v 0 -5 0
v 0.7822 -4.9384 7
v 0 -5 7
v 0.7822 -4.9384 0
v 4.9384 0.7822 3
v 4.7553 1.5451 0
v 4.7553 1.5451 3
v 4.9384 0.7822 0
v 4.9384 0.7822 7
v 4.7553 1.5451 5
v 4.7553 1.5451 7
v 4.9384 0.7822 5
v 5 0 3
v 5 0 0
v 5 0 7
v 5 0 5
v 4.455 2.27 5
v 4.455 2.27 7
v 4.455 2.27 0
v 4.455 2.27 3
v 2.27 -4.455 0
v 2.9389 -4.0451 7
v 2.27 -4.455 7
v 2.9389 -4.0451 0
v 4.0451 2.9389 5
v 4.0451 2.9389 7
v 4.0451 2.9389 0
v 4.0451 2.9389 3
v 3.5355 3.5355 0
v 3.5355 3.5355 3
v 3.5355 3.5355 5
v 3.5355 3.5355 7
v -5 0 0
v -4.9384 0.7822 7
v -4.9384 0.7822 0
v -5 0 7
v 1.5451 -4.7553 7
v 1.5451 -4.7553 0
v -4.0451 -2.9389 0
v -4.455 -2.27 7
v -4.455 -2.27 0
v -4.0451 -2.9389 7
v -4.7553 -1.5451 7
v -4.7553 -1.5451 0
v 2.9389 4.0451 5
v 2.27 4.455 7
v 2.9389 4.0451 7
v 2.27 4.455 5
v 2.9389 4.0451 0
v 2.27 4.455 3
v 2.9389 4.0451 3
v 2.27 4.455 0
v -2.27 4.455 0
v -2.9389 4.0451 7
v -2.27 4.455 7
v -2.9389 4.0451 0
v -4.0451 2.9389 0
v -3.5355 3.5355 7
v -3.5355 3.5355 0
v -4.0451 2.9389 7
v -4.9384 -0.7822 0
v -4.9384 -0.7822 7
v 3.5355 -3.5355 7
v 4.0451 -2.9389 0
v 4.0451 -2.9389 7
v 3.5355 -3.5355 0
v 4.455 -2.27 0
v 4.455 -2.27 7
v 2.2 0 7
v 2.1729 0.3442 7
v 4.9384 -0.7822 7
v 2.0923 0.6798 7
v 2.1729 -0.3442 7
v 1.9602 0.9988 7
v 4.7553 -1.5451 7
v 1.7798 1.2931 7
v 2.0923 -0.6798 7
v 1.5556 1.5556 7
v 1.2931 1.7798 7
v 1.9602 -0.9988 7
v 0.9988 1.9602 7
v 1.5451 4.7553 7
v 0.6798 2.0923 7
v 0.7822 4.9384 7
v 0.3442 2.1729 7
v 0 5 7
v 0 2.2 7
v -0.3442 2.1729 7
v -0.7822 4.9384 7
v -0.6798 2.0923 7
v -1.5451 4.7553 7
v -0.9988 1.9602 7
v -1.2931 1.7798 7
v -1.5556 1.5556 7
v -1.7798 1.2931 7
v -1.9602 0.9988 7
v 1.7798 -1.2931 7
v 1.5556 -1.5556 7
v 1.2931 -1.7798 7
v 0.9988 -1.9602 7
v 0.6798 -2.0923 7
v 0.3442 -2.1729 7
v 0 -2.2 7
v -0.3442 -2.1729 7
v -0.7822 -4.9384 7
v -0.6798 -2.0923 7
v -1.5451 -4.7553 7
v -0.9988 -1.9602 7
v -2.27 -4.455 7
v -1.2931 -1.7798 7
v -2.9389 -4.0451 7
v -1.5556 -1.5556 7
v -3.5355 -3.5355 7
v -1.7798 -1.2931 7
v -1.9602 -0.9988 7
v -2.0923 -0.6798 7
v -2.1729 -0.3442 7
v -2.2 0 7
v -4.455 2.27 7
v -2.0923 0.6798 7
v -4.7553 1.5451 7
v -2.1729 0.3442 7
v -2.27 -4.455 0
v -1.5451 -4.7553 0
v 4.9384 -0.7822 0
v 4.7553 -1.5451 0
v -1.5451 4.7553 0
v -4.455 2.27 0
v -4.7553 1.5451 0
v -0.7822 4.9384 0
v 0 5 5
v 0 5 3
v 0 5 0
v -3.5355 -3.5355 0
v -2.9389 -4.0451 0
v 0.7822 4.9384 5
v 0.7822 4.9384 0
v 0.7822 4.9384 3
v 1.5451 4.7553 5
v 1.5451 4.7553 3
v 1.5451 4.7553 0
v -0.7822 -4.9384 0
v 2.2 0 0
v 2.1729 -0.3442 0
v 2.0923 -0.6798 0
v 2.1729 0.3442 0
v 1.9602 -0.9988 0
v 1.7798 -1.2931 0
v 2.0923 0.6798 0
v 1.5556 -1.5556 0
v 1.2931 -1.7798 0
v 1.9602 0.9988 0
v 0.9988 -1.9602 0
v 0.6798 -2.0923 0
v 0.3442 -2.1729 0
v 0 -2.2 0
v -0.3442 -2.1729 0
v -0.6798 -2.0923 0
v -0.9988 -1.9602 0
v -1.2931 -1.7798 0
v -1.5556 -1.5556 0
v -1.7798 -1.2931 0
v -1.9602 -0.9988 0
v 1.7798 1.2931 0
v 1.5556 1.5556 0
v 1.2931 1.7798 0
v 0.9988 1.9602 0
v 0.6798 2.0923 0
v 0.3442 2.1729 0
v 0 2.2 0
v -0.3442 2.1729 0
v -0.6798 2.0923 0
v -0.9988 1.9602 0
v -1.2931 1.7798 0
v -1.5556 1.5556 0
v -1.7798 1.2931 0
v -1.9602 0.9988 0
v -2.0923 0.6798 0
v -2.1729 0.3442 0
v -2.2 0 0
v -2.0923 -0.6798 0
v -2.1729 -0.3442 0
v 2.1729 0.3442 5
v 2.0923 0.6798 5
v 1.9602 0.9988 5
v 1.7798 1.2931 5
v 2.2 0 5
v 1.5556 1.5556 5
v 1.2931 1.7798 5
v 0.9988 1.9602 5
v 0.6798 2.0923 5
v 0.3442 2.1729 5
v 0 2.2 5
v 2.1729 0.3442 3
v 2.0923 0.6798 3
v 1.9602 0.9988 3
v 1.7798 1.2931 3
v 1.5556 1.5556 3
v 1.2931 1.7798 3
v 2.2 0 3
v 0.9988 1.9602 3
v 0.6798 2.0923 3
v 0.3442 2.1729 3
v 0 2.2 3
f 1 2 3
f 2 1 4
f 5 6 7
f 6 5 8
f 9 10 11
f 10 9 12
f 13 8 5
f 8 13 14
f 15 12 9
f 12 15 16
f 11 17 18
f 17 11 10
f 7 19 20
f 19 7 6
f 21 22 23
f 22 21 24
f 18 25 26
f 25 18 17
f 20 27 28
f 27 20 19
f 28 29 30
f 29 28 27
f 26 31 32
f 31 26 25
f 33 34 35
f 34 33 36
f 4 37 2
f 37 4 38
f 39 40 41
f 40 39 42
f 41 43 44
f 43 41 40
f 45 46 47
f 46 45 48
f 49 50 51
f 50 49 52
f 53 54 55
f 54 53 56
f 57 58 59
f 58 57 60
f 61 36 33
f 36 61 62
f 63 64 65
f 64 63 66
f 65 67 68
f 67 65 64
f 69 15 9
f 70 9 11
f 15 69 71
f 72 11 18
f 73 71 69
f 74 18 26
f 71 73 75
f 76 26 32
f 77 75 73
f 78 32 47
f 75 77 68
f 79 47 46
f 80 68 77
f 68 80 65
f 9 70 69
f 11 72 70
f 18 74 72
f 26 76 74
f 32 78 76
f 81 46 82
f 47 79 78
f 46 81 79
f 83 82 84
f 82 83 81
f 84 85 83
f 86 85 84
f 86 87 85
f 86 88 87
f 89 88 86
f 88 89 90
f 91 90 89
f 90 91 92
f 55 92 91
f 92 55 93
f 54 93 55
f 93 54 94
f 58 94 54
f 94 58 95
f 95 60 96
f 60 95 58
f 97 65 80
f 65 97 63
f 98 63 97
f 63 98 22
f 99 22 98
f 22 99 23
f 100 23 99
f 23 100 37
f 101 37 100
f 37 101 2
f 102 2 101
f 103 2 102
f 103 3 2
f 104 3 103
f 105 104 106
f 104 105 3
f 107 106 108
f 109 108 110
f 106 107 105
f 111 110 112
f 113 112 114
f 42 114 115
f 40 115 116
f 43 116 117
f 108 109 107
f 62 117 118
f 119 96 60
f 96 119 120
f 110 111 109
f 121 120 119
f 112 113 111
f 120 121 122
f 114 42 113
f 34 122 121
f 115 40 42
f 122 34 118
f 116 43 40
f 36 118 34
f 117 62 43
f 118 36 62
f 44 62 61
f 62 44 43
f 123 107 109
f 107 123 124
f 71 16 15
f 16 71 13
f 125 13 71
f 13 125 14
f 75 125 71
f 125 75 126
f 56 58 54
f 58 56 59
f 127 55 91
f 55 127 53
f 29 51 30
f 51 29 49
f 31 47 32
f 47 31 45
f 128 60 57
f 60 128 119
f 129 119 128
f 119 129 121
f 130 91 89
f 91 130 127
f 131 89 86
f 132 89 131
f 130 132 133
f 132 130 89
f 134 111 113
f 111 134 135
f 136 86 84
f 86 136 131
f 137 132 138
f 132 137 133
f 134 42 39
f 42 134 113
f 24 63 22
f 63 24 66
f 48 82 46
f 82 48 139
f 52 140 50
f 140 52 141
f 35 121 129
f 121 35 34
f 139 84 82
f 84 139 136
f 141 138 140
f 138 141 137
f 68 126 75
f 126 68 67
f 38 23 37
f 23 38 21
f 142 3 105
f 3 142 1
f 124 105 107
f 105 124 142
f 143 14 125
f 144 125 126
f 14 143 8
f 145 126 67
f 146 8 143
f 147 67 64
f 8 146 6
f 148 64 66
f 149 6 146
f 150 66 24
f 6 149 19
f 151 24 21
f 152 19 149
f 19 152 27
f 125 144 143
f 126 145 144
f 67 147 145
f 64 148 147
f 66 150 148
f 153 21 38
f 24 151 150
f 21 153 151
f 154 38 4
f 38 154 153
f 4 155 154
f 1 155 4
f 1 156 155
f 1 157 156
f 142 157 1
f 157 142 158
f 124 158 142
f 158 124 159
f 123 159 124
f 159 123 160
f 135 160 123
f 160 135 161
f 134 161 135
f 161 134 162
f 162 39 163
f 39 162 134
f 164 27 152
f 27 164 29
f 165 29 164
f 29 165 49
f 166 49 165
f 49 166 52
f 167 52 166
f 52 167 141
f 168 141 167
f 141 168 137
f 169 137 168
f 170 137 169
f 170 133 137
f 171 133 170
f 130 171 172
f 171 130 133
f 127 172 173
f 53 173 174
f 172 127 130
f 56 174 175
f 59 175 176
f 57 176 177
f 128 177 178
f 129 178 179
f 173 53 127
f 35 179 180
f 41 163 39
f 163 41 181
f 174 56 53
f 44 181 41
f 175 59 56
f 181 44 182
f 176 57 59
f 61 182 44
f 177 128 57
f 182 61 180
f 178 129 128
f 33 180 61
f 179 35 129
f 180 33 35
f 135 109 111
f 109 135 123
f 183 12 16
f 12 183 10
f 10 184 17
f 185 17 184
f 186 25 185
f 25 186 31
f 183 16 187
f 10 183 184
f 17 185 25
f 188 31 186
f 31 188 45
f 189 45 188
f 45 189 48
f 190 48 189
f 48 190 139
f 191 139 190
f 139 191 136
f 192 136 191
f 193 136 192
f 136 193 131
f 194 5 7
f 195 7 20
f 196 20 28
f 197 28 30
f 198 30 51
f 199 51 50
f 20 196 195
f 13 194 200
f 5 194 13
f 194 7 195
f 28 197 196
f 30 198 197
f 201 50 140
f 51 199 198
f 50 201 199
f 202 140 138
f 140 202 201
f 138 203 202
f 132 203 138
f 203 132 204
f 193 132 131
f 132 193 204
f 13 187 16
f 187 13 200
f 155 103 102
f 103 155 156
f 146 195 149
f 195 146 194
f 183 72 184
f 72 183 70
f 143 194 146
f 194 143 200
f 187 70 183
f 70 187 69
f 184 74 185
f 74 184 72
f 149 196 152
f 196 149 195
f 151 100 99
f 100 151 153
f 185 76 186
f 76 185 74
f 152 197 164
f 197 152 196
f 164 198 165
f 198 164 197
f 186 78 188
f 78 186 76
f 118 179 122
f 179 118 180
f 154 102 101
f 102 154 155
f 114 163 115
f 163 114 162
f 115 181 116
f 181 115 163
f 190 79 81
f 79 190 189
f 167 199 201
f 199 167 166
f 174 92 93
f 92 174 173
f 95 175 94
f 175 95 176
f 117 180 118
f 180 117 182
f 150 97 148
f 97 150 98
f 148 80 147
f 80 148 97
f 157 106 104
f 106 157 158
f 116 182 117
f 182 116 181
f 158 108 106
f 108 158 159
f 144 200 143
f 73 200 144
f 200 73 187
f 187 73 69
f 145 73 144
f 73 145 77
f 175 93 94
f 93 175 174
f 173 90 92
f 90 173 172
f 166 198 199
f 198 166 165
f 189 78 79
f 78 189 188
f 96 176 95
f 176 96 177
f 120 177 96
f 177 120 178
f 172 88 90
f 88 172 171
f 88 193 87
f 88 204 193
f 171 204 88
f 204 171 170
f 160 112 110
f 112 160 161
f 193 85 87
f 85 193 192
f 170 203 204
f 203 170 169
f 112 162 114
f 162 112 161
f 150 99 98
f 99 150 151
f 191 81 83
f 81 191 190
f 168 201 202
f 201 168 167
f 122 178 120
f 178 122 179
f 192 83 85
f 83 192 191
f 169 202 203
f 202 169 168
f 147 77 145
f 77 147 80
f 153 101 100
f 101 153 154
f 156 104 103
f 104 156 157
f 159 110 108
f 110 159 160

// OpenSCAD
pcb_thickness=2;
pcb_z_shift=3;

post_height= 7;
post_radius= 5;
$fn=40;

// Insert geometry
insert_outer_radius = 4.4 / 2;

module corner_post() {
    difference() {
        cylinder(h = post_height, r = post_radius);
        translate(v = [0,0,pcb_z_shift])
            cube(size = [post_radius,post_radius,pcb_thickness]);
        cylinder(h = post_height, r = insert_outer_radius);
    }
}

module side_post(){
    difference() {
        cylinder(h = post_height, r = post_radius);
        translate(v = [0,-post_radius,pcb_z_shift])
            cube(size = [post_radius,2*post_radius,pcb_thickness]);
        cylinder(h = post_height, r = insert_outer_radius);
    }    
}

corner_post();
//side_post();
